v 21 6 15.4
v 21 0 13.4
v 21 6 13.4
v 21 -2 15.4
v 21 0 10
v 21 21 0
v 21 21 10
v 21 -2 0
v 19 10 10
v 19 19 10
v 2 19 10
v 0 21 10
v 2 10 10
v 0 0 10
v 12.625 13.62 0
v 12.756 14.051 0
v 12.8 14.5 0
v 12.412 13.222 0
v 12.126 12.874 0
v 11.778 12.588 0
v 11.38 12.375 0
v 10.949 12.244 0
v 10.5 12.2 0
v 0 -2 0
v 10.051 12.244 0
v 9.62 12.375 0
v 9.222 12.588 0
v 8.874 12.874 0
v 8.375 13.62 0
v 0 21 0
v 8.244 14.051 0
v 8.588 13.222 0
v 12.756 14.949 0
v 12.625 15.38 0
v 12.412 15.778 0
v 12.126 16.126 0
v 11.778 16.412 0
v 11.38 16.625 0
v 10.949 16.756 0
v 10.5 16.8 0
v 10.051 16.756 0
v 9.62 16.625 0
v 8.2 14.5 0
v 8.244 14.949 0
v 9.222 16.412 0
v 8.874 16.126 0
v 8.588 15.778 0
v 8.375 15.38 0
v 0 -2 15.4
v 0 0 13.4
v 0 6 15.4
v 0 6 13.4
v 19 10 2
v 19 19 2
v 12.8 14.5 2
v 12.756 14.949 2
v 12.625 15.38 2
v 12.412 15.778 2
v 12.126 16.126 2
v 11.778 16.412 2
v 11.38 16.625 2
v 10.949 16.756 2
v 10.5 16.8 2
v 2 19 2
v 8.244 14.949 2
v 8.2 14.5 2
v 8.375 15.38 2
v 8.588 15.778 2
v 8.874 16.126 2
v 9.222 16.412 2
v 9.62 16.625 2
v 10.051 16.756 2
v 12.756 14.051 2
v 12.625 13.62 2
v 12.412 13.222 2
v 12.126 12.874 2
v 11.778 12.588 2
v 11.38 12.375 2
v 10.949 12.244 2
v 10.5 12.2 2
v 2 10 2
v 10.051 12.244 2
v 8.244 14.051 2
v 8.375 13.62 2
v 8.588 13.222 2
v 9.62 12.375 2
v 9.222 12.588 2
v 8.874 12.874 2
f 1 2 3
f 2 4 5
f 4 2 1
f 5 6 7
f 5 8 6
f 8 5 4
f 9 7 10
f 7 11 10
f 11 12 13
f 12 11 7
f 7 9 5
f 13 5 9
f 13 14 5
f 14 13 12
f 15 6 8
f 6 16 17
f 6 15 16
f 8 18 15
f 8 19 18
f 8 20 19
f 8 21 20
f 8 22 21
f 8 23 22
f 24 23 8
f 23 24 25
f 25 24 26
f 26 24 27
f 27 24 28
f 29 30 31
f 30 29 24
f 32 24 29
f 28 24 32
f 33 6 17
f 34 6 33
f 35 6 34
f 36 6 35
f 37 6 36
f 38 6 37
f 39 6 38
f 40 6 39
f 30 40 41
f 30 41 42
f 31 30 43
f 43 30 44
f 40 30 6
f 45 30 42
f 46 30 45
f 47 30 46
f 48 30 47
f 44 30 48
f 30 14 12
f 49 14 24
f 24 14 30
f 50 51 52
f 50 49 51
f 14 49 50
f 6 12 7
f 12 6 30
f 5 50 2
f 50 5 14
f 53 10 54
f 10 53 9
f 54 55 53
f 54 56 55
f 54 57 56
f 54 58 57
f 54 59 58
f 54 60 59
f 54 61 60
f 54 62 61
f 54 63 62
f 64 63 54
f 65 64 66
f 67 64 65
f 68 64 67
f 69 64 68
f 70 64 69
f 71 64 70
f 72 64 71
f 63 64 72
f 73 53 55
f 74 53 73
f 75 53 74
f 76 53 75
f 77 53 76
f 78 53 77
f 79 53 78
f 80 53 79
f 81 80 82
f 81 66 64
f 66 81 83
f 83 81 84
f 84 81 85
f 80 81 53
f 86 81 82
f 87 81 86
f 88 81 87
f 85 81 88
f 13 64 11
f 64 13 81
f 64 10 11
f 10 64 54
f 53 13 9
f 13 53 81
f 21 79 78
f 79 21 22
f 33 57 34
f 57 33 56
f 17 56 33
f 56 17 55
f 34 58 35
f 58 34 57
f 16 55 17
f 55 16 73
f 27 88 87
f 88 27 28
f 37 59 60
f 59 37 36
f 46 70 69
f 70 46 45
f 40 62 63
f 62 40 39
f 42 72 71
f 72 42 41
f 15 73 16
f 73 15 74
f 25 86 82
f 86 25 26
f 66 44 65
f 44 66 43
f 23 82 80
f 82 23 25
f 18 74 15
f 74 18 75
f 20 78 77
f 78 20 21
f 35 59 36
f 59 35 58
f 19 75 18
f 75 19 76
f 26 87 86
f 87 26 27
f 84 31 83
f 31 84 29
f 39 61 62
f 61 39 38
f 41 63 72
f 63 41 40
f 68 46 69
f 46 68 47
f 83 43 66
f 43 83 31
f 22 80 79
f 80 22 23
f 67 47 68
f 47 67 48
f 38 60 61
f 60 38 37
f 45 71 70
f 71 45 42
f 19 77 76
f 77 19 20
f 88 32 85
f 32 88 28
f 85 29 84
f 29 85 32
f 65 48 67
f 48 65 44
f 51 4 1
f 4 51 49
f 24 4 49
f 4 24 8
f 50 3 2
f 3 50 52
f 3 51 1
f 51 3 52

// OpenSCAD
$fn=32;
width = 21;
thickness = 2;
wall_thickness = 2;
box_thickness = 10;
bottom_thickness = 3.4;
overhang = 6;
channel_width = 13;
screw_hole_radius = 2.3;

union() {
  difference() {
    cube([width, overhang + wall_thickness + channel_width, box_thickness]);
      
    translate([thickness, overhang + wall_thickness + thickness, thickness])
    cube([width - 2*thickness, channel_width - 2*thickness, box_thickness]);
      
    translate([width/2, overhang + wall_thickness + channel_width/2, -1])
    cylinder(h=thickness+2, r=screw_hole_radius);
  }
    
  translate([0, -thickness, 0])
  cube([width, thickness, box_thickness + bottom_thickness + thickness]);
   
  translate([0, 0, box_thickness + bottom_thickness])
  cube([width, overhang, thickness]);
   
}
